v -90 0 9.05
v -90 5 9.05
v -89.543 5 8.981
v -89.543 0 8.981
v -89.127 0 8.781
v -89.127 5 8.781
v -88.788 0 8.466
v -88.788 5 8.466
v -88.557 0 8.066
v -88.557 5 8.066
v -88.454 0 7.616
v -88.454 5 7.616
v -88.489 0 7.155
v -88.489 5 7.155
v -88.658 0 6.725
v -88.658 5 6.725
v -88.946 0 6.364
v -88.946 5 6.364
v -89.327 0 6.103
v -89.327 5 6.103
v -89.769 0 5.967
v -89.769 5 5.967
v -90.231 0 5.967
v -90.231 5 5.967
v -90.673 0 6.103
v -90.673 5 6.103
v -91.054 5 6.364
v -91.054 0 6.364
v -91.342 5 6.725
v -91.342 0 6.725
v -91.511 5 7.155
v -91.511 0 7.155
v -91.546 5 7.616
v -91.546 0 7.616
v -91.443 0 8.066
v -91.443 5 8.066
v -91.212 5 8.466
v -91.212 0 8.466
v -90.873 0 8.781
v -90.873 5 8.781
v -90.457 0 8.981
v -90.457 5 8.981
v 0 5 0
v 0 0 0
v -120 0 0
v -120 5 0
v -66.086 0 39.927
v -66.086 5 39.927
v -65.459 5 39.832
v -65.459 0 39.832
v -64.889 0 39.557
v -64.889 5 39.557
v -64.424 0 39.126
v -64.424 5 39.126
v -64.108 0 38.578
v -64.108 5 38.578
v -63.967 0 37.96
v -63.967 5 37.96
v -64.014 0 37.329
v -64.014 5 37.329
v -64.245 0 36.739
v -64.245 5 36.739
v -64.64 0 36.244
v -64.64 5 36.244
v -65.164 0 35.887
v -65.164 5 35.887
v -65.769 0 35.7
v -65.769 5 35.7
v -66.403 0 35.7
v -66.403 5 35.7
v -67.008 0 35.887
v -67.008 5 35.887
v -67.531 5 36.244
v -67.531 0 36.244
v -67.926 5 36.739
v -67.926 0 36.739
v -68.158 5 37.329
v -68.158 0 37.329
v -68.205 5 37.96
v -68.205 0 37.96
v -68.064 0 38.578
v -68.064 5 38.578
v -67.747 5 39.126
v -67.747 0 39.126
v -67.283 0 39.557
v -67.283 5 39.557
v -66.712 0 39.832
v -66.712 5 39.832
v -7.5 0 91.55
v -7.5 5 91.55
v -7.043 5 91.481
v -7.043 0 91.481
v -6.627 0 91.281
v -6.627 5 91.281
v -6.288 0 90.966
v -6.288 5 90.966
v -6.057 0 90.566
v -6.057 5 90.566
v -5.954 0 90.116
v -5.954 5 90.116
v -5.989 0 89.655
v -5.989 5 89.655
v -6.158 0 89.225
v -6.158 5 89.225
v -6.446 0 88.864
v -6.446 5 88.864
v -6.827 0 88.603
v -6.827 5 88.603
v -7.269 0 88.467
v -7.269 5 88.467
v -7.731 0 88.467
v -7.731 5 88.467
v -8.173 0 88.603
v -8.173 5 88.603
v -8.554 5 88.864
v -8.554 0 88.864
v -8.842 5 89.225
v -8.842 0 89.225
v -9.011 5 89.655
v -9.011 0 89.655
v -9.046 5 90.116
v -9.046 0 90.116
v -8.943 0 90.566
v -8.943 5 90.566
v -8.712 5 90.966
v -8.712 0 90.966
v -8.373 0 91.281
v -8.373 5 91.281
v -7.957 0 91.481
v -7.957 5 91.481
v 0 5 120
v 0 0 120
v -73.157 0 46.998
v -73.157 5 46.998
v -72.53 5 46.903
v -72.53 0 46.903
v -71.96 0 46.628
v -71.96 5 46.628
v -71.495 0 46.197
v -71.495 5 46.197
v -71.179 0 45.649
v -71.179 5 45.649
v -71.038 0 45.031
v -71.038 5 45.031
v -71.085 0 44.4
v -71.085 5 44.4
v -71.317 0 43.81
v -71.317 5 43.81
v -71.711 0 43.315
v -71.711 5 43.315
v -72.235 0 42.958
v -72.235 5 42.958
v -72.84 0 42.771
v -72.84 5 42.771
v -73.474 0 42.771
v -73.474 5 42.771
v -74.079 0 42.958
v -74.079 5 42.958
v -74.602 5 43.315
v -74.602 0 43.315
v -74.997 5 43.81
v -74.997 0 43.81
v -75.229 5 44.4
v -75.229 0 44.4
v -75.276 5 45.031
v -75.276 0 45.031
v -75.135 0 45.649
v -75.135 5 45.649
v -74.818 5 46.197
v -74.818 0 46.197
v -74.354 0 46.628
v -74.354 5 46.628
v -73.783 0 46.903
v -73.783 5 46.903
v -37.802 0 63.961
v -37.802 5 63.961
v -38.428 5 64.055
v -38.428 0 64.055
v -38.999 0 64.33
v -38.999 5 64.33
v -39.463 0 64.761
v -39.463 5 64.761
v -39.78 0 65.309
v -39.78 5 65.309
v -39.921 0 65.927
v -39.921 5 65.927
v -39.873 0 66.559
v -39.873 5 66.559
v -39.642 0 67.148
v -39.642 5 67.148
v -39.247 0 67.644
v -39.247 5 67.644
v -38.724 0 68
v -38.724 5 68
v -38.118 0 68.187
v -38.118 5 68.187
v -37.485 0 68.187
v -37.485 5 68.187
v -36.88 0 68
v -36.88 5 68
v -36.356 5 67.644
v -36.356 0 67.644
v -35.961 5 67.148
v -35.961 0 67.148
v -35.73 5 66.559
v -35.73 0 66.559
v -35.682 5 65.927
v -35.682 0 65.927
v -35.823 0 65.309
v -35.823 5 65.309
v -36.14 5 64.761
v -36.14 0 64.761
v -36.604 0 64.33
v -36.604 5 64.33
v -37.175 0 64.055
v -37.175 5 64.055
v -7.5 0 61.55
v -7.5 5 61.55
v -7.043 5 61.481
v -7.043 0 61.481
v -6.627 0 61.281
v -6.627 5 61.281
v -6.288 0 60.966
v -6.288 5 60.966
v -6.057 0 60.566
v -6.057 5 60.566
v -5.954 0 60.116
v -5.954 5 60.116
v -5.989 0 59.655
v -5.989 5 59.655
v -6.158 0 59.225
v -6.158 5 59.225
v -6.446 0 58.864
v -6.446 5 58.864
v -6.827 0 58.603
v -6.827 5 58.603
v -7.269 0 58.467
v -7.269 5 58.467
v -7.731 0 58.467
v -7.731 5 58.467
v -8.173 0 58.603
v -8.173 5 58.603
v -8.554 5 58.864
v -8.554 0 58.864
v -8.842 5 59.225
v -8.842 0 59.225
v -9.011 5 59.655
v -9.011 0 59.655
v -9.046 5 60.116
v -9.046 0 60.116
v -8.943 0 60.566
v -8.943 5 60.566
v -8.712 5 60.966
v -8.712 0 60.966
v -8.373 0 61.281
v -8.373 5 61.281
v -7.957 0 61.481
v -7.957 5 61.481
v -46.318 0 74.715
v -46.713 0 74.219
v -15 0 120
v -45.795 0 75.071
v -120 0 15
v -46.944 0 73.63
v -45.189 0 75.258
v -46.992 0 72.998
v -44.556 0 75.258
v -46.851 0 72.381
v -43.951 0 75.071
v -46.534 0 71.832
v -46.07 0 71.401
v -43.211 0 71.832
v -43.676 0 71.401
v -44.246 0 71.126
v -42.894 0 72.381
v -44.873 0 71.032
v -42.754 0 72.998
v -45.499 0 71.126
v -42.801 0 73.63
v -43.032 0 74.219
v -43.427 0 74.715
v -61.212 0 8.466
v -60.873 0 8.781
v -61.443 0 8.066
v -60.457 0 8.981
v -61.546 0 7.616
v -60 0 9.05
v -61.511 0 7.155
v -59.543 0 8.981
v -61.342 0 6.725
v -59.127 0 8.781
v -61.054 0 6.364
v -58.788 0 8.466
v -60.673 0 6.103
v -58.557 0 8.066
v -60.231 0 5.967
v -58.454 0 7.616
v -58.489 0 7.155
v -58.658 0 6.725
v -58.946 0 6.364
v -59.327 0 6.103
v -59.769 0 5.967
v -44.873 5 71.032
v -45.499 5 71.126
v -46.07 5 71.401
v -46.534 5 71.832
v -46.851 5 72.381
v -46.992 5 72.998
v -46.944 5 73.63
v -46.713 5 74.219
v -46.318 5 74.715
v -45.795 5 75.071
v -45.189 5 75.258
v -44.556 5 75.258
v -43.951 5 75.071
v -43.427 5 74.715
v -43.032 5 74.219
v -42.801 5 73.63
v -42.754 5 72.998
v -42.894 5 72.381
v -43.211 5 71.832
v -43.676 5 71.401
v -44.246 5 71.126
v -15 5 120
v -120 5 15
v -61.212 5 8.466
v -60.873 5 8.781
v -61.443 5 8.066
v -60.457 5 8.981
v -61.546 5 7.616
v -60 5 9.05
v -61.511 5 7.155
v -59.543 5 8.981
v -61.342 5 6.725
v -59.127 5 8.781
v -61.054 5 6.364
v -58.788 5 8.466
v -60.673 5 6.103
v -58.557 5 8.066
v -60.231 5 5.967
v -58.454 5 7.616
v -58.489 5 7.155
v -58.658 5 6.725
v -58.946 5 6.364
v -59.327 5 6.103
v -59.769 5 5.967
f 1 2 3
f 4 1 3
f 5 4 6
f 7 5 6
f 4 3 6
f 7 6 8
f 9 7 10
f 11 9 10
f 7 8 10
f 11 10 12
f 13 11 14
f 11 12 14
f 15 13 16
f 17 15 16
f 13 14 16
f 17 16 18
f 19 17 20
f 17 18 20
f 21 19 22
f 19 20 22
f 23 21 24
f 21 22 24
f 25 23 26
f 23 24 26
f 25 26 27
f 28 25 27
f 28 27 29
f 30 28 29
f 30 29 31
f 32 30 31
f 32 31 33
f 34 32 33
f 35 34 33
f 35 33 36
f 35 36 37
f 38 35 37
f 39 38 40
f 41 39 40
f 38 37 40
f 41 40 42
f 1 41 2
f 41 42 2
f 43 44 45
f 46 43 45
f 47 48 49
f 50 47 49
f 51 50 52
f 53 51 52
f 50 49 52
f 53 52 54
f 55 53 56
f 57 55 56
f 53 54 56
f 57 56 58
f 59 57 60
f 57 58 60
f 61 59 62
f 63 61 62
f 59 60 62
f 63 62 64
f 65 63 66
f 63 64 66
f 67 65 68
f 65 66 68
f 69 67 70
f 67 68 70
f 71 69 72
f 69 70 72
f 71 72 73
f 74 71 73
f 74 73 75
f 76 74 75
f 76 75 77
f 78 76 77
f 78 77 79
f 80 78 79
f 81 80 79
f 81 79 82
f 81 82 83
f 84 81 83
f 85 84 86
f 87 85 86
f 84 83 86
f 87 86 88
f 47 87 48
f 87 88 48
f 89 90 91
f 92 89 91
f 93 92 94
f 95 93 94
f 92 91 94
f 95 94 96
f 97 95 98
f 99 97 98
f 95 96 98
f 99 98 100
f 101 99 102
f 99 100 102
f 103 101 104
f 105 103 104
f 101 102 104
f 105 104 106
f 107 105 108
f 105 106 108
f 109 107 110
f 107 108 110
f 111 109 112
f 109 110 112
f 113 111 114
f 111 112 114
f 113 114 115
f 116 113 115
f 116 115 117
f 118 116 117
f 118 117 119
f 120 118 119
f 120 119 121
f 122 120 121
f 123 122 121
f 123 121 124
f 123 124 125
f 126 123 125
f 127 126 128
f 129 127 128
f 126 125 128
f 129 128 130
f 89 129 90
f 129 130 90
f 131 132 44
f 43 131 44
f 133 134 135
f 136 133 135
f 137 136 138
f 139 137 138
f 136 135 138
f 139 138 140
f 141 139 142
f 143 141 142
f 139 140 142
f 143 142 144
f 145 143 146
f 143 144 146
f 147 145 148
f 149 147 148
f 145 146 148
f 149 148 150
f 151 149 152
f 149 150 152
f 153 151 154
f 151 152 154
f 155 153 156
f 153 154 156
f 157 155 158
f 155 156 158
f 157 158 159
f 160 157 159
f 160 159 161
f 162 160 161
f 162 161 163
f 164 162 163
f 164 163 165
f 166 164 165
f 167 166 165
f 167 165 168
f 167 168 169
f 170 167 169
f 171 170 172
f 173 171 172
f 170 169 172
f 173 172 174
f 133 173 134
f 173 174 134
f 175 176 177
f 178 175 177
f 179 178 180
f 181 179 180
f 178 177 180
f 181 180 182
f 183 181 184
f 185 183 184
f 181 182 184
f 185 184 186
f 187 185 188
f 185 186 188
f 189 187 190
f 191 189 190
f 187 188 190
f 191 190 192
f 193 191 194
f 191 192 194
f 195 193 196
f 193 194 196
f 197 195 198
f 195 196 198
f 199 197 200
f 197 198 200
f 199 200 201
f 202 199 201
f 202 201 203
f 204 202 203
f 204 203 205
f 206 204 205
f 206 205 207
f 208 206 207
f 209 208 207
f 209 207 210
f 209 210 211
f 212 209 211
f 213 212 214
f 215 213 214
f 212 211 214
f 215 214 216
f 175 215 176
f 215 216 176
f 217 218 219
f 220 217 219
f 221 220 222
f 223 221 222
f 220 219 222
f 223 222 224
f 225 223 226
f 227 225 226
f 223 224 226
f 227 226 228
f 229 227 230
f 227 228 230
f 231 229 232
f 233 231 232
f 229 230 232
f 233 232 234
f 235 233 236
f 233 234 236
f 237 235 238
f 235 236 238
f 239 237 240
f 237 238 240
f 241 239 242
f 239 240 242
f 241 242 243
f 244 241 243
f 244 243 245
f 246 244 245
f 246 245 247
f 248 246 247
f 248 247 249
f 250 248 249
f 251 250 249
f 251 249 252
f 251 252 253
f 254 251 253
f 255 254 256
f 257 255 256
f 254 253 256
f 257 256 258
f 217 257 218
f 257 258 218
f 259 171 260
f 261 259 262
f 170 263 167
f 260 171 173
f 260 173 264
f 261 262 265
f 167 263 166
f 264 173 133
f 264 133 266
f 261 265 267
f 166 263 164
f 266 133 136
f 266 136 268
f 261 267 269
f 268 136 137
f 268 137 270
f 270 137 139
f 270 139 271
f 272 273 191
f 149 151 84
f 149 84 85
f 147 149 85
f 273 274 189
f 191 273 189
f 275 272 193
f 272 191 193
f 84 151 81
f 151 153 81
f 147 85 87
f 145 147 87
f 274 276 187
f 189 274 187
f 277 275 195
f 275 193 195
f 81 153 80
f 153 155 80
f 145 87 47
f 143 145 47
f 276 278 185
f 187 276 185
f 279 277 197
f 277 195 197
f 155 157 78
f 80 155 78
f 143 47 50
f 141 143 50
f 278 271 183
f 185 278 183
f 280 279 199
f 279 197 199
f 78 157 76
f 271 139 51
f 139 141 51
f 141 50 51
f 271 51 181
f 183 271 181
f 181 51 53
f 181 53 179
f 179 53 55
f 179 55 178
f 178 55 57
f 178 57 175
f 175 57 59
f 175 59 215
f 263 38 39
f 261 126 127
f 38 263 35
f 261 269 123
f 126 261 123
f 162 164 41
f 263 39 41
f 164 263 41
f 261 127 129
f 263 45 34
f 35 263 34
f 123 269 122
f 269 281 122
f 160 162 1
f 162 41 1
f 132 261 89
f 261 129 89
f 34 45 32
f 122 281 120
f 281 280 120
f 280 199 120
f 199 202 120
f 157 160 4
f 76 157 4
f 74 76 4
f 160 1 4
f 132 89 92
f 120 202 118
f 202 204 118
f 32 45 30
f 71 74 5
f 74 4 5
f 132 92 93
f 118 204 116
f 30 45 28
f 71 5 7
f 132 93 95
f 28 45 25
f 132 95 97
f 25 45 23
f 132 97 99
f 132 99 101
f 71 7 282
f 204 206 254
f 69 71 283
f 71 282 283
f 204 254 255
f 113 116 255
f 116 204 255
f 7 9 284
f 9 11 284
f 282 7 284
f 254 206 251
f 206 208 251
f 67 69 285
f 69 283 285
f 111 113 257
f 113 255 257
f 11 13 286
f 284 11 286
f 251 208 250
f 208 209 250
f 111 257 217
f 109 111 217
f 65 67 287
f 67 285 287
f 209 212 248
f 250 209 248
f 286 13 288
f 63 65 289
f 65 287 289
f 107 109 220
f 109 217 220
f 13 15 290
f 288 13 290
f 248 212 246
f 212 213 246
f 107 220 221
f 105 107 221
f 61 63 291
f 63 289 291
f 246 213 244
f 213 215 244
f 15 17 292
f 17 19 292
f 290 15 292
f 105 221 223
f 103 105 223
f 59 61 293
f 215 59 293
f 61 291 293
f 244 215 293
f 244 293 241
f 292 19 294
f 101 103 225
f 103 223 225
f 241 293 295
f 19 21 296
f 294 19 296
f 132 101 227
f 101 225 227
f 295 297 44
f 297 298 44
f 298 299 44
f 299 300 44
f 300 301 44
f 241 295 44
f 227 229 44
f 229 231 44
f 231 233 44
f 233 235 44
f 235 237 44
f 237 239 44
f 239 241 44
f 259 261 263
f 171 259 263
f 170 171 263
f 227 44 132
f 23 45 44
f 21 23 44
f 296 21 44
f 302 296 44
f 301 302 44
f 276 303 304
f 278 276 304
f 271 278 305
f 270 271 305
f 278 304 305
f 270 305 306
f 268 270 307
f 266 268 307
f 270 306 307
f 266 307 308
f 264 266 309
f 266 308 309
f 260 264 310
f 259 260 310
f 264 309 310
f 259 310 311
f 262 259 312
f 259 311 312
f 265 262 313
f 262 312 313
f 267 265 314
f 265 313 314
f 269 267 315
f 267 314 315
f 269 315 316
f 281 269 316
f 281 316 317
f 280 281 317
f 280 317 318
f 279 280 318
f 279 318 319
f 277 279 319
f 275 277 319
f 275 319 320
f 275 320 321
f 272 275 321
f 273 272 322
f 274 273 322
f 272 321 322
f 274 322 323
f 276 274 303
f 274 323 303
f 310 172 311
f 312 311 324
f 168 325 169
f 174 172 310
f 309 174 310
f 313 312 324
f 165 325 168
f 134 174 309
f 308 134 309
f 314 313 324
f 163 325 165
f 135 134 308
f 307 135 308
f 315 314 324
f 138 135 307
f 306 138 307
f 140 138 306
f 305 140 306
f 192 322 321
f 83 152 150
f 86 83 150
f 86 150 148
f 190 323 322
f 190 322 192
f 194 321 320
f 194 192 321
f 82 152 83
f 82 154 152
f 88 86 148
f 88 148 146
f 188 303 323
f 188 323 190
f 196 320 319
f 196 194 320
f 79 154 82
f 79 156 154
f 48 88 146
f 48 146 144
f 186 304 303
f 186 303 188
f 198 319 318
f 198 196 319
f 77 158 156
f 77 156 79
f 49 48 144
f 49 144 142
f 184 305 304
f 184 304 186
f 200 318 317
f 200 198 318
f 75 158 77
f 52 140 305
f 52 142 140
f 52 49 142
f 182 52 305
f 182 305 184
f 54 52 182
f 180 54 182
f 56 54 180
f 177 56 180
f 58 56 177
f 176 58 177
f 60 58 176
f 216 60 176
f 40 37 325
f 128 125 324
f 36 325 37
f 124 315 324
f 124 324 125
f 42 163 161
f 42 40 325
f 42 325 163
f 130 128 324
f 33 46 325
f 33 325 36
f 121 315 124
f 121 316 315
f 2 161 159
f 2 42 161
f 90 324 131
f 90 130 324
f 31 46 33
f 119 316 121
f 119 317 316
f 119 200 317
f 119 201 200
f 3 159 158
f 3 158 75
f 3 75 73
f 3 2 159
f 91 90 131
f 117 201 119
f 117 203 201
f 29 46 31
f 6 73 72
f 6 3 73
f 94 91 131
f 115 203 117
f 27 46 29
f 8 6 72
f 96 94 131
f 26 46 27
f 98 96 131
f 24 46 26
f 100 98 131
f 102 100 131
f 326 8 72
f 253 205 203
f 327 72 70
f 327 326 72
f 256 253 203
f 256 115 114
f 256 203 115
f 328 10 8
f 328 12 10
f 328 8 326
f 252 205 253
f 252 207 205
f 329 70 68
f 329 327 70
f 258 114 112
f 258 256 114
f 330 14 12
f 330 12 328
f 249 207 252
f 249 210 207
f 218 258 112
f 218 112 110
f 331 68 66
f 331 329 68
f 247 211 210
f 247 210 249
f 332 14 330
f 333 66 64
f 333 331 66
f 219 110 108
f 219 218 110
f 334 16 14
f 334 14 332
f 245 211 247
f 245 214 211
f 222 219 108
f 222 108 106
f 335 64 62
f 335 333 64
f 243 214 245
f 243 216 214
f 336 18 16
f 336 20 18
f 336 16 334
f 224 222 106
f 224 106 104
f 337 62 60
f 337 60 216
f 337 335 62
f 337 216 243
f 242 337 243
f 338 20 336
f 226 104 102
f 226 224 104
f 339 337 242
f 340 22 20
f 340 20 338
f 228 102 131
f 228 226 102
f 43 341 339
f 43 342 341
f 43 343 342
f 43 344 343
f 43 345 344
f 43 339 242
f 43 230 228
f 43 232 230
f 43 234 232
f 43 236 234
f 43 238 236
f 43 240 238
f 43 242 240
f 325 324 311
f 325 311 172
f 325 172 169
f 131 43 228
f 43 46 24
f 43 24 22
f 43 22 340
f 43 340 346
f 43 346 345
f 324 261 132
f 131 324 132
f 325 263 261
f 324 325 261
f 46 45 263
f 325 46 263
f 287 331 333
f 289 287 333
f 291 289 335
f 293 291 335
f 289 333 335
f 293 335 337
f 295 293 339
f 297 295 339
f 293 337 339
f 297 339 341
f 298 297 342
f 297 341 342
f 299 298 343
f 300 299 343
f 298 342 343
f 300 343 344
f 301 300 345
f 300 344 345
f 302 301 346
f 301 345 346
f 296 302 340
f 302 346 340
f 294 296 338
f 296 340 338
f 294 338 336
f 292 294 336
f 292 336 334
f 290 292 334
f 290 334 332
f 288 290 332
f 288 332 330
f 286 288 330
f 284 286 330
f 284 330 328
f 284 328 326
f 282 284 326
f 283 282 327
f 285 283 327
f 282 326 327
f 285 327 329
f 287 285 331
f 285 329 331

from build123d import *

# Parameters (mm, degrees)
BOSS_EXTRUDE1_DEPTH = 5
SKETCH3_R           = 1.55
CUT_EXTRUDE1_DEPTH  = 5
SKETCH4_R           = 2.125
CUT_EXTRUDE2_DEPTH  = 5


with BuildPart() as part:
    # Sketch2 → Boss-Extrude1 (new body)
    with BuildSketch(Plane(origin=(0, 0, 0), x_dir=(1, 0, 0), z_dir=(0, 1, 0))):
        Polygon((-120, -15), (-15, -120), (0, -120), (0, 0), (-120, 0), align=None)
    extrude(amount=BOSS_EXTRUDE1_DEPTH)

    # Sketch3 → Cut-Extrude1 (cut)
    with BuildSketch(Plane(origin=(0, 5, 0), x_dir=(1, 0, 0), z_dir=(0, 1, 0))):
        with Locations(Location((-90, -7.5, 0), (0, 0, 270))):
            Circle(SKETCH3_R)
        with Locations(Location((-60, -7.5, 0), (0, 0, 270))):
            Circle(SKETCH3_R)
        with Locations(Location((-7.5, -90, 0), (0, 0, 270))):
            Circle(SKETCH3_R)
        with Locations(Location((-7.5, -60, 0), (0, 0, 270))):
            Circle(SKETCH3_R)
    extrude(amount=-CUT_EXTRUDE1_DEPTH, mode=Mode.SUBTRACT)

    # Sketch4 → Cut-Extrude2 (cut)
    with BuildSketch(Plane(origin=(0, 5, 0), x_dir=(1, 0, 0), z_dir=(0, 1, 0))):
        with Locations(Location((-66.085786438, -37.80151519, 0), (0, 0, 270))):
            Circle(SKETCH4_R)
        with Locations(Location((-73.156854249, -44.872583002, 0), (0, 0, 270))):
            Circle(SKETCH4_R)
        with Locations(Location((-44.872583002, -73.156854249, 0), (0, 0, 90))):
            Circle(SKETCH4_R)
        with Locations(Location((-37.80151519, -66.085786438, 0), (0, 0, 90))):
            Circle(SKETCH4_R)
    extrude(amount=-CUT_EXTRUDE2_DEPTH, mode=Mode.SUBTRACT)


solid = part.part
